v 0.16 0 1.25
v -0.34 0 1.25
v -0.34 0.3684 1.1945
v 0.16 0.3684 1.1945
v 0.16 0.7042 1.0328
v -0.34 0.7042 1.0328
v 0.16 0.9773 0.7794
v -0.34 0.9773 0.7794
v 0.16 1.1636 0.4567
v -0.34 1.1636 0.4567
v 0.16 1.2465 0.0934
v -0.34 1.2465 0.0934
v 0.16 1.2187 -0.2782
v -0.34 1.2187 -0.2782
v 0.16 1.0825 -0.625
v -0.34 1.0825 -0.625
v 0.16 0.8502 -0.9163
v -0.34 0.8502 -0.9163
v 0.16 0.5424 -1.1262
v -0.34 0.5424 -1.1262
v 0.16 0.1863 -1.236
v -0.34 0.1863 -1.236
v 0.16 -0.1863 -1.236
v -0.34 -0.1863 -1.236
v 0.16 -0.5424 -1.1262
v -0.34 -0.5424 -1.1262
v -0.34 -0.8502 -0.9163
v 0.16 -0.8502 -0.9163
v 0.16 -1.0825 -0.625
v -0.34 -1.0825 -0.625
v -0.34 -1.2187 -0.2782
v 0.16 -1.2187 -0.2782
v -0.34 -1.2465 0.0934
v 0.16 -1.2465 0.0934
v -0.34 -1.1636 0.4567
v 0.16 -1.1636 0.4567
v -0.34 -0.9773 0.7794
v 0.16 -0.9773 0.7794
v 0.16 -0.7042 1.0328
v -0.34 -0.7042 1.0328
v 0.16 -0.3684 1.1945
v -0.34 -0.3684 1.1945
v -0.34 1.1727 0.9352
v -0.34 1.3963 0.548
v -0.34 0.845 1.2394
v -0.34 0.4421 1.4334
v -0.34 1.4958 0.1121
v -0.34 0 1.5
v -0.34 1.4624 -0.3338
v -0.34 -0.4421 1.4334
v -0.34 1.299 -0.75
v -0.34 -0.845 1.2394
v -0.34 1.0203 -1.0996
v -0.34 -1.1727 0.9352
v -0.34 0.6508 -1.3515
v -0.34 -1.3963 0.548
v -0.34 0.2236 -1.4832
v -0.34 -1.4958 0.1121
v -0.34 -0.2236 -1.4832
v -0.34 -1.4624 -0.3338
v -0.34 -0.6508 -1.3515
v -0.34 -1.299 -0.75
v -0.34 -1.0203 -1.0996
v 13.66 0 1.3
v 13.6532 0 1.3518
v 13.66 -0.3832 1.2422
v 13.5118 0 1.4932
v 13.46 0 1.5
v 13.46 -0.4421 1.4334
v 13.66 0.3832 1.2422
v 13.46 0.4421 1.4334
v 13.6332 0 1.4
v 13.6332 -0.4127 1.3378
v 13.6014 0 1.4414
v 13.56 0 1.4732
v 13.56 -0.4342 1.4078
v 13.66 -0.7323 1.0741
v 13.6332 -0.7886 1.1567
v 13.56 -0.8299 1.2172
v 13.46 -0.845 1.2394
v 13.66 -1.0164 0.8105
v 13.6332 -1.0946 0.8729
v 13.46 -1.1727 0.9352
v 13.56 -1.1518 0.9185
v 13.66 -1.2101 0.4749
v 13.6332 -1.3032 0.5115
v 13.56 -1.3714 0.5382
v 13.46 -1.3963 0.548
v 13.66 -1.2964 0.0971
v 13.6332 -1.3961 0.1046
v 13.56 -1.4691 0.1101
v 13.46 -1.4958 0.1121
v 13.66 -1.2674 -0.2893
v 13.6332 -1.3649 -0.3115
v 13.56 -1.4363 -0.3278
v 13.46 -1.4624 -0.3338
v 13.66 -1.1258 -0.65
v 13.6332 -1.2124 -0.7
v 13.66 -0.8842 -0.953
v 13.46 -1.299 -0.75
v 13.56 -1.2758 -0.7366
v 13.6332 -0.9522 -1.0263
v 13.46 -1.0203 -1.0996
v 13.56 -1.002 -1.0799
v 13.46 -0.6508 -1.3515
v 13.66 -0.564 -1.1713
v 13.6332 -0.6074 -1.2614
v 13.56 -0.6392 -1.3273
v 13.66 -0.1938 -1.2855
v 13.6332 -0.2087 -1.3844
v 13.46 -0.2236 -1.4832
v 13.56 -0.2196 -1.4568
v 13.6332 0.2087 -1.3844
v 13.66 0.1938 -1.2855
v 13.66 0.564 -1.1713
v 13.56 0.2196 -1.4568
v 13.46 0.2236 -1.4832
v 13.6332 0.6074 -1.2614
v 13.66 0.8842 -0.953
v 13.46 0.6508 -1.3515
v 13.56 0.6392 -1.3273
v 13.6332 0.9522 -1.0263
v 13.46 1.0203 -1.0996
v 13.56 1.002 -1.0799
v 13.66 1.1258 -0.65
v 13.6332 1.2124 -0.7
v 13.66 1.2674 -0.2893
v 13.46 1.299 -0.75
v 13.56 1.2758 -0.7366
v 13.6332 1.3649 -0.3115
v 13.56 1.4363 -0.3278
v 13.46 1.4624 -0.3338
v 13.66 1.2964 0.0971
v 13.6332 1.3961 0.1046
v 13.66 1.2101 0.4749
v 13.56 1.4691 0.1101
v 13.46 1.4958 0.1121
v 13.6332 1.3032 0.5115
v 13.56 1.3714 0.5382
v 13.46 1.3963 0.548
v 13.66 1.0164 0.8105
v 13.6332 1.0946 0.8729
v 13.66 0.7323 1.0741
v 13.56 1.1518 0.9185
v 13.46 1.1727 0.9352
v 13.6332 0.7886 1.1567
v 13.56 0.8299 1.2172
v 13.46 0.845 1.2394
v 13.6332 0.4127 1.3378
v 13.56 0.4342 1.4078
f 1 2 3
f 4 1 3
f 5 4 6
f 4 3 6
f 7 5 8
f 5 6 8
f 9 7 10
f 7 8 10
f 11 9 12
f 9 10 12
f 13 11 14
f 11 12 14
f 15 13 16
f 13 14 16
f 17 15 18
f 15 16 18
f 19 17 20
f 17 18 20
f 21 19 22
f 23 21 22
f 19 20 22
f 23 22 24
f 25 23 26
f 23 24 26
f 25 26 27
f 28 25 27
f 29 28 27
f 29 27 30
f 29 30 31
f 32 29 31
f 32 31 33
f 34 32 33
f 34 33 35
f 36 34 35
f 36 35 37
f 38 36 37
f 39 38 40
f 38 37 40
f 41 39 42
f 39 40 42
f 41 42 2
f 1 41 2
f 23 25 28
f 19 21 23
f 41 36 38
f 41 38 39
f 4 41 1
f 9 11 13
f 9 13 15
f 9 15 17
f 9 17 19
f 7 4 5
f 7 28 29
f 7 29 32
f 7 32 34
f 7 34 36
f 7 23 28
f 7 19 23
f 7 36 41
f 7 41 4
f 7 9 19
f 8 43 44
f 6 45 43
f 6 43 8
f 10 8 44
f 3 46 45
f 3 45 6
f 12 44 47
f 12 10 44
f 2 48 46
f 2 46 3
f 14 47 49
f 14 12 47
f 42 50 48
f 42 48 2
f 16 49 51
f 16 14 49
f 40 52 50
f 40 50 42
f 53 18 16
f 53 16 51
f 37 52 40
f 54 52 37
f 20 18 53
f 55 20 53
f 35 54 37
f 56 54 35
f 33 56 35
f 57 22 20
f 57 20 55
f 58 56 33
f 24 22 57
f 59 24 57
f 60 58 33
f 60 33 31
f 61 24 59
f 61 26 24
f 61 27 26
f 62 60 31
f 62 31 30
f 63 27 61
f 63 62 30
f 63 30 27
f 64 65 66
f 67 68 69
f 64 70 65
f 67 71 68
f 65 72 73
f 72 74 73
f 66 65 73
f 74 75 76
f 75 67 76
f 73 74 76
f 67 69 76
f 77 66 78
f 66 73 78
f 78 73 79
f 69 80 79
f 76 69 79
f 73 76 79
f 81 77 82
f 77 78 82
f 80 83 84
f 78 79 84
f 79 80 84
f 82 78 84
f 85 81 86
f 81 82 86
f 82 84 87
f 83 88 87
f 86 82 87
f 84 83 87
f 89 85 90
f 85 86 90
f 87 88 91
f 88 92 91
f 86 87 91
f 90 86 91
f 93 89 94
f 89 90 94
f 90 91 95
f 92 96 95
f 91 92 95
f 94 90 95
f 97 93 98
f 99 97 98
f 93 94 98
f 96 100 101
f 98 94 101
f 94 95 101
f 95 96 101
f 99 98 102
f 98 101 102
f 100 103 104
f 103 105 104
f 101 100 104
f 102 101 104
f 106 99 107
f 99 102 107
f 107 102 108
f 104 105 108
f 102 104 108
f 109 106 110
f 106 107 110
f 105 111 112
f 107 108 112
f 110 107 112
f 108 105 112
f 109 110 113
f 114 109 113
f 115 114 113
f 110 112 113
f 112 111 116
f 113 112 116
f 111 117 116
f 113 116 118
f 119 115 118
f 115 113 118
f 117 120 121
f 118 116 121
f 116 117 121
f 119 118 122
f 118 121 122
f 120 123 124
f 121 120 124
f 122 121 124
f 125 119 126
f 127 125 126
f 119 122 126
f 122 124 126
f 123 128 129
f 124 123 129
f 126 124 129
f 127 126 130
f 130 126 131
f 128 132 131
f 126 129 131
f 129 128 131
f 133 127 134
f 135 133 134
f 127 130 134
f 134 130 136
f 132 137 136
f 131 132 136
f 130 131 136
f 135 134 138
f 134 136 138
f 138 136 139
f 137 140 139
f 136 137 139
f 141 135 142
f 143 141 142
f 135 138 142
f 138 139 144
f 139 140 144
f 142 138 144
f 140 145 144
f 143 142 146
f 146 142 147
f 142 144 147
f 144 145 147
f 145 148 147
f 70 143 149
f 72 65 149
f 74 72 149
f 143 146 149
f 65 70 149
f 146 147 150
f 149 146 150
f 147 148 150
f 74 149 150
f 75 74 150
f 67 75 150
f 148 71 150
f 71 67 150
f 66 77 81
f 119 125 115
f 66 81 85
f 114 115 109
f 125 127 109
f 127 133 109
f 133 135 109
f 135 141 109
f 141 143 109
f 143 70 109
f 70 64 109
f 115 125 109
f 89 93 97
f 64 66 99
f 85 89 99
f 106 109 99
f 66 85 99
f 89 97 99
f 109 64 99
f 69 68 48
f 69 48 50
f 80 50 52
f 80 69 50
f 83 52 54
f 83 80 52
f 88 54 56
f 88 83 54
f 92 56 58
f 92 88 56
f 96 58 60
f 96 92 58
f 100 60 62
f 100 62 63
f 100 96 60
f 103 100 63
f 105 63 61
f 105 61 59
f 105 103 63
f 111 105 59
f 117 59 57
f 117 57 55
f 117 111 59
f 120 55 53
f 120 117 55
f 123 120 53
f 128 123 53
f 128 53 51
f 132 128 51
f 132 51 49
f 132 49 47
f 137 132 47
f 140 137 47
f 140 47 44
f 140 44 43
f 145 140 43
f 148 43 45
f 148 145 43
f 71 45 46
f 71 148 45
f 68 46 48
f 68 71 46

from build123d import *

# Parameters (mm, degrees)
ESQUISSE1_W             = 14
ESQUISSE1_H             = 1.5
CONG_1_R                = 0.2
ESQUISSE2_R             = 1.25
ENL_V_MAT_EXTRU_1_DEPTH = 0.5


with BuildPart() as part:
    # Esquisse1 → Révolution1 (revolve)
    with BuildSketch(Plane.XY, mode=Mode.PRIVATE) as r_volution1_sk:
        with Locations((6.66, 0.75)):
            Rectangle(ESQUISSE1_W, ESQUISSE1_H)
    revolve(r_volution1_sk.sketch.rotate(Axis((-5.768945874, 0, 0), (1, 0, 0)), 90), axis=Axis((-5.768945874, 0, 0), (1, 0, 0)))

    # Congé1
    cong_1_edges = [part.edges().sort_by_distance(p)[0] for p in [
        (13.66, 0, -1.5),
    ]]
    fillet(cong_1_edges, radius=CONG_1_R)

    # Esquisse2 → Enlèv. mat.-Extru.1 (cut)
    with BuildSketch(Plane.ZY.offset(0.34)):
        Circle(ESQUISSE2_R)
    extrude(amount=-ENL_V_MAT_EXTRU_1_DEPTH, mode=Mode.SUBTRACT)


solid = part.part
